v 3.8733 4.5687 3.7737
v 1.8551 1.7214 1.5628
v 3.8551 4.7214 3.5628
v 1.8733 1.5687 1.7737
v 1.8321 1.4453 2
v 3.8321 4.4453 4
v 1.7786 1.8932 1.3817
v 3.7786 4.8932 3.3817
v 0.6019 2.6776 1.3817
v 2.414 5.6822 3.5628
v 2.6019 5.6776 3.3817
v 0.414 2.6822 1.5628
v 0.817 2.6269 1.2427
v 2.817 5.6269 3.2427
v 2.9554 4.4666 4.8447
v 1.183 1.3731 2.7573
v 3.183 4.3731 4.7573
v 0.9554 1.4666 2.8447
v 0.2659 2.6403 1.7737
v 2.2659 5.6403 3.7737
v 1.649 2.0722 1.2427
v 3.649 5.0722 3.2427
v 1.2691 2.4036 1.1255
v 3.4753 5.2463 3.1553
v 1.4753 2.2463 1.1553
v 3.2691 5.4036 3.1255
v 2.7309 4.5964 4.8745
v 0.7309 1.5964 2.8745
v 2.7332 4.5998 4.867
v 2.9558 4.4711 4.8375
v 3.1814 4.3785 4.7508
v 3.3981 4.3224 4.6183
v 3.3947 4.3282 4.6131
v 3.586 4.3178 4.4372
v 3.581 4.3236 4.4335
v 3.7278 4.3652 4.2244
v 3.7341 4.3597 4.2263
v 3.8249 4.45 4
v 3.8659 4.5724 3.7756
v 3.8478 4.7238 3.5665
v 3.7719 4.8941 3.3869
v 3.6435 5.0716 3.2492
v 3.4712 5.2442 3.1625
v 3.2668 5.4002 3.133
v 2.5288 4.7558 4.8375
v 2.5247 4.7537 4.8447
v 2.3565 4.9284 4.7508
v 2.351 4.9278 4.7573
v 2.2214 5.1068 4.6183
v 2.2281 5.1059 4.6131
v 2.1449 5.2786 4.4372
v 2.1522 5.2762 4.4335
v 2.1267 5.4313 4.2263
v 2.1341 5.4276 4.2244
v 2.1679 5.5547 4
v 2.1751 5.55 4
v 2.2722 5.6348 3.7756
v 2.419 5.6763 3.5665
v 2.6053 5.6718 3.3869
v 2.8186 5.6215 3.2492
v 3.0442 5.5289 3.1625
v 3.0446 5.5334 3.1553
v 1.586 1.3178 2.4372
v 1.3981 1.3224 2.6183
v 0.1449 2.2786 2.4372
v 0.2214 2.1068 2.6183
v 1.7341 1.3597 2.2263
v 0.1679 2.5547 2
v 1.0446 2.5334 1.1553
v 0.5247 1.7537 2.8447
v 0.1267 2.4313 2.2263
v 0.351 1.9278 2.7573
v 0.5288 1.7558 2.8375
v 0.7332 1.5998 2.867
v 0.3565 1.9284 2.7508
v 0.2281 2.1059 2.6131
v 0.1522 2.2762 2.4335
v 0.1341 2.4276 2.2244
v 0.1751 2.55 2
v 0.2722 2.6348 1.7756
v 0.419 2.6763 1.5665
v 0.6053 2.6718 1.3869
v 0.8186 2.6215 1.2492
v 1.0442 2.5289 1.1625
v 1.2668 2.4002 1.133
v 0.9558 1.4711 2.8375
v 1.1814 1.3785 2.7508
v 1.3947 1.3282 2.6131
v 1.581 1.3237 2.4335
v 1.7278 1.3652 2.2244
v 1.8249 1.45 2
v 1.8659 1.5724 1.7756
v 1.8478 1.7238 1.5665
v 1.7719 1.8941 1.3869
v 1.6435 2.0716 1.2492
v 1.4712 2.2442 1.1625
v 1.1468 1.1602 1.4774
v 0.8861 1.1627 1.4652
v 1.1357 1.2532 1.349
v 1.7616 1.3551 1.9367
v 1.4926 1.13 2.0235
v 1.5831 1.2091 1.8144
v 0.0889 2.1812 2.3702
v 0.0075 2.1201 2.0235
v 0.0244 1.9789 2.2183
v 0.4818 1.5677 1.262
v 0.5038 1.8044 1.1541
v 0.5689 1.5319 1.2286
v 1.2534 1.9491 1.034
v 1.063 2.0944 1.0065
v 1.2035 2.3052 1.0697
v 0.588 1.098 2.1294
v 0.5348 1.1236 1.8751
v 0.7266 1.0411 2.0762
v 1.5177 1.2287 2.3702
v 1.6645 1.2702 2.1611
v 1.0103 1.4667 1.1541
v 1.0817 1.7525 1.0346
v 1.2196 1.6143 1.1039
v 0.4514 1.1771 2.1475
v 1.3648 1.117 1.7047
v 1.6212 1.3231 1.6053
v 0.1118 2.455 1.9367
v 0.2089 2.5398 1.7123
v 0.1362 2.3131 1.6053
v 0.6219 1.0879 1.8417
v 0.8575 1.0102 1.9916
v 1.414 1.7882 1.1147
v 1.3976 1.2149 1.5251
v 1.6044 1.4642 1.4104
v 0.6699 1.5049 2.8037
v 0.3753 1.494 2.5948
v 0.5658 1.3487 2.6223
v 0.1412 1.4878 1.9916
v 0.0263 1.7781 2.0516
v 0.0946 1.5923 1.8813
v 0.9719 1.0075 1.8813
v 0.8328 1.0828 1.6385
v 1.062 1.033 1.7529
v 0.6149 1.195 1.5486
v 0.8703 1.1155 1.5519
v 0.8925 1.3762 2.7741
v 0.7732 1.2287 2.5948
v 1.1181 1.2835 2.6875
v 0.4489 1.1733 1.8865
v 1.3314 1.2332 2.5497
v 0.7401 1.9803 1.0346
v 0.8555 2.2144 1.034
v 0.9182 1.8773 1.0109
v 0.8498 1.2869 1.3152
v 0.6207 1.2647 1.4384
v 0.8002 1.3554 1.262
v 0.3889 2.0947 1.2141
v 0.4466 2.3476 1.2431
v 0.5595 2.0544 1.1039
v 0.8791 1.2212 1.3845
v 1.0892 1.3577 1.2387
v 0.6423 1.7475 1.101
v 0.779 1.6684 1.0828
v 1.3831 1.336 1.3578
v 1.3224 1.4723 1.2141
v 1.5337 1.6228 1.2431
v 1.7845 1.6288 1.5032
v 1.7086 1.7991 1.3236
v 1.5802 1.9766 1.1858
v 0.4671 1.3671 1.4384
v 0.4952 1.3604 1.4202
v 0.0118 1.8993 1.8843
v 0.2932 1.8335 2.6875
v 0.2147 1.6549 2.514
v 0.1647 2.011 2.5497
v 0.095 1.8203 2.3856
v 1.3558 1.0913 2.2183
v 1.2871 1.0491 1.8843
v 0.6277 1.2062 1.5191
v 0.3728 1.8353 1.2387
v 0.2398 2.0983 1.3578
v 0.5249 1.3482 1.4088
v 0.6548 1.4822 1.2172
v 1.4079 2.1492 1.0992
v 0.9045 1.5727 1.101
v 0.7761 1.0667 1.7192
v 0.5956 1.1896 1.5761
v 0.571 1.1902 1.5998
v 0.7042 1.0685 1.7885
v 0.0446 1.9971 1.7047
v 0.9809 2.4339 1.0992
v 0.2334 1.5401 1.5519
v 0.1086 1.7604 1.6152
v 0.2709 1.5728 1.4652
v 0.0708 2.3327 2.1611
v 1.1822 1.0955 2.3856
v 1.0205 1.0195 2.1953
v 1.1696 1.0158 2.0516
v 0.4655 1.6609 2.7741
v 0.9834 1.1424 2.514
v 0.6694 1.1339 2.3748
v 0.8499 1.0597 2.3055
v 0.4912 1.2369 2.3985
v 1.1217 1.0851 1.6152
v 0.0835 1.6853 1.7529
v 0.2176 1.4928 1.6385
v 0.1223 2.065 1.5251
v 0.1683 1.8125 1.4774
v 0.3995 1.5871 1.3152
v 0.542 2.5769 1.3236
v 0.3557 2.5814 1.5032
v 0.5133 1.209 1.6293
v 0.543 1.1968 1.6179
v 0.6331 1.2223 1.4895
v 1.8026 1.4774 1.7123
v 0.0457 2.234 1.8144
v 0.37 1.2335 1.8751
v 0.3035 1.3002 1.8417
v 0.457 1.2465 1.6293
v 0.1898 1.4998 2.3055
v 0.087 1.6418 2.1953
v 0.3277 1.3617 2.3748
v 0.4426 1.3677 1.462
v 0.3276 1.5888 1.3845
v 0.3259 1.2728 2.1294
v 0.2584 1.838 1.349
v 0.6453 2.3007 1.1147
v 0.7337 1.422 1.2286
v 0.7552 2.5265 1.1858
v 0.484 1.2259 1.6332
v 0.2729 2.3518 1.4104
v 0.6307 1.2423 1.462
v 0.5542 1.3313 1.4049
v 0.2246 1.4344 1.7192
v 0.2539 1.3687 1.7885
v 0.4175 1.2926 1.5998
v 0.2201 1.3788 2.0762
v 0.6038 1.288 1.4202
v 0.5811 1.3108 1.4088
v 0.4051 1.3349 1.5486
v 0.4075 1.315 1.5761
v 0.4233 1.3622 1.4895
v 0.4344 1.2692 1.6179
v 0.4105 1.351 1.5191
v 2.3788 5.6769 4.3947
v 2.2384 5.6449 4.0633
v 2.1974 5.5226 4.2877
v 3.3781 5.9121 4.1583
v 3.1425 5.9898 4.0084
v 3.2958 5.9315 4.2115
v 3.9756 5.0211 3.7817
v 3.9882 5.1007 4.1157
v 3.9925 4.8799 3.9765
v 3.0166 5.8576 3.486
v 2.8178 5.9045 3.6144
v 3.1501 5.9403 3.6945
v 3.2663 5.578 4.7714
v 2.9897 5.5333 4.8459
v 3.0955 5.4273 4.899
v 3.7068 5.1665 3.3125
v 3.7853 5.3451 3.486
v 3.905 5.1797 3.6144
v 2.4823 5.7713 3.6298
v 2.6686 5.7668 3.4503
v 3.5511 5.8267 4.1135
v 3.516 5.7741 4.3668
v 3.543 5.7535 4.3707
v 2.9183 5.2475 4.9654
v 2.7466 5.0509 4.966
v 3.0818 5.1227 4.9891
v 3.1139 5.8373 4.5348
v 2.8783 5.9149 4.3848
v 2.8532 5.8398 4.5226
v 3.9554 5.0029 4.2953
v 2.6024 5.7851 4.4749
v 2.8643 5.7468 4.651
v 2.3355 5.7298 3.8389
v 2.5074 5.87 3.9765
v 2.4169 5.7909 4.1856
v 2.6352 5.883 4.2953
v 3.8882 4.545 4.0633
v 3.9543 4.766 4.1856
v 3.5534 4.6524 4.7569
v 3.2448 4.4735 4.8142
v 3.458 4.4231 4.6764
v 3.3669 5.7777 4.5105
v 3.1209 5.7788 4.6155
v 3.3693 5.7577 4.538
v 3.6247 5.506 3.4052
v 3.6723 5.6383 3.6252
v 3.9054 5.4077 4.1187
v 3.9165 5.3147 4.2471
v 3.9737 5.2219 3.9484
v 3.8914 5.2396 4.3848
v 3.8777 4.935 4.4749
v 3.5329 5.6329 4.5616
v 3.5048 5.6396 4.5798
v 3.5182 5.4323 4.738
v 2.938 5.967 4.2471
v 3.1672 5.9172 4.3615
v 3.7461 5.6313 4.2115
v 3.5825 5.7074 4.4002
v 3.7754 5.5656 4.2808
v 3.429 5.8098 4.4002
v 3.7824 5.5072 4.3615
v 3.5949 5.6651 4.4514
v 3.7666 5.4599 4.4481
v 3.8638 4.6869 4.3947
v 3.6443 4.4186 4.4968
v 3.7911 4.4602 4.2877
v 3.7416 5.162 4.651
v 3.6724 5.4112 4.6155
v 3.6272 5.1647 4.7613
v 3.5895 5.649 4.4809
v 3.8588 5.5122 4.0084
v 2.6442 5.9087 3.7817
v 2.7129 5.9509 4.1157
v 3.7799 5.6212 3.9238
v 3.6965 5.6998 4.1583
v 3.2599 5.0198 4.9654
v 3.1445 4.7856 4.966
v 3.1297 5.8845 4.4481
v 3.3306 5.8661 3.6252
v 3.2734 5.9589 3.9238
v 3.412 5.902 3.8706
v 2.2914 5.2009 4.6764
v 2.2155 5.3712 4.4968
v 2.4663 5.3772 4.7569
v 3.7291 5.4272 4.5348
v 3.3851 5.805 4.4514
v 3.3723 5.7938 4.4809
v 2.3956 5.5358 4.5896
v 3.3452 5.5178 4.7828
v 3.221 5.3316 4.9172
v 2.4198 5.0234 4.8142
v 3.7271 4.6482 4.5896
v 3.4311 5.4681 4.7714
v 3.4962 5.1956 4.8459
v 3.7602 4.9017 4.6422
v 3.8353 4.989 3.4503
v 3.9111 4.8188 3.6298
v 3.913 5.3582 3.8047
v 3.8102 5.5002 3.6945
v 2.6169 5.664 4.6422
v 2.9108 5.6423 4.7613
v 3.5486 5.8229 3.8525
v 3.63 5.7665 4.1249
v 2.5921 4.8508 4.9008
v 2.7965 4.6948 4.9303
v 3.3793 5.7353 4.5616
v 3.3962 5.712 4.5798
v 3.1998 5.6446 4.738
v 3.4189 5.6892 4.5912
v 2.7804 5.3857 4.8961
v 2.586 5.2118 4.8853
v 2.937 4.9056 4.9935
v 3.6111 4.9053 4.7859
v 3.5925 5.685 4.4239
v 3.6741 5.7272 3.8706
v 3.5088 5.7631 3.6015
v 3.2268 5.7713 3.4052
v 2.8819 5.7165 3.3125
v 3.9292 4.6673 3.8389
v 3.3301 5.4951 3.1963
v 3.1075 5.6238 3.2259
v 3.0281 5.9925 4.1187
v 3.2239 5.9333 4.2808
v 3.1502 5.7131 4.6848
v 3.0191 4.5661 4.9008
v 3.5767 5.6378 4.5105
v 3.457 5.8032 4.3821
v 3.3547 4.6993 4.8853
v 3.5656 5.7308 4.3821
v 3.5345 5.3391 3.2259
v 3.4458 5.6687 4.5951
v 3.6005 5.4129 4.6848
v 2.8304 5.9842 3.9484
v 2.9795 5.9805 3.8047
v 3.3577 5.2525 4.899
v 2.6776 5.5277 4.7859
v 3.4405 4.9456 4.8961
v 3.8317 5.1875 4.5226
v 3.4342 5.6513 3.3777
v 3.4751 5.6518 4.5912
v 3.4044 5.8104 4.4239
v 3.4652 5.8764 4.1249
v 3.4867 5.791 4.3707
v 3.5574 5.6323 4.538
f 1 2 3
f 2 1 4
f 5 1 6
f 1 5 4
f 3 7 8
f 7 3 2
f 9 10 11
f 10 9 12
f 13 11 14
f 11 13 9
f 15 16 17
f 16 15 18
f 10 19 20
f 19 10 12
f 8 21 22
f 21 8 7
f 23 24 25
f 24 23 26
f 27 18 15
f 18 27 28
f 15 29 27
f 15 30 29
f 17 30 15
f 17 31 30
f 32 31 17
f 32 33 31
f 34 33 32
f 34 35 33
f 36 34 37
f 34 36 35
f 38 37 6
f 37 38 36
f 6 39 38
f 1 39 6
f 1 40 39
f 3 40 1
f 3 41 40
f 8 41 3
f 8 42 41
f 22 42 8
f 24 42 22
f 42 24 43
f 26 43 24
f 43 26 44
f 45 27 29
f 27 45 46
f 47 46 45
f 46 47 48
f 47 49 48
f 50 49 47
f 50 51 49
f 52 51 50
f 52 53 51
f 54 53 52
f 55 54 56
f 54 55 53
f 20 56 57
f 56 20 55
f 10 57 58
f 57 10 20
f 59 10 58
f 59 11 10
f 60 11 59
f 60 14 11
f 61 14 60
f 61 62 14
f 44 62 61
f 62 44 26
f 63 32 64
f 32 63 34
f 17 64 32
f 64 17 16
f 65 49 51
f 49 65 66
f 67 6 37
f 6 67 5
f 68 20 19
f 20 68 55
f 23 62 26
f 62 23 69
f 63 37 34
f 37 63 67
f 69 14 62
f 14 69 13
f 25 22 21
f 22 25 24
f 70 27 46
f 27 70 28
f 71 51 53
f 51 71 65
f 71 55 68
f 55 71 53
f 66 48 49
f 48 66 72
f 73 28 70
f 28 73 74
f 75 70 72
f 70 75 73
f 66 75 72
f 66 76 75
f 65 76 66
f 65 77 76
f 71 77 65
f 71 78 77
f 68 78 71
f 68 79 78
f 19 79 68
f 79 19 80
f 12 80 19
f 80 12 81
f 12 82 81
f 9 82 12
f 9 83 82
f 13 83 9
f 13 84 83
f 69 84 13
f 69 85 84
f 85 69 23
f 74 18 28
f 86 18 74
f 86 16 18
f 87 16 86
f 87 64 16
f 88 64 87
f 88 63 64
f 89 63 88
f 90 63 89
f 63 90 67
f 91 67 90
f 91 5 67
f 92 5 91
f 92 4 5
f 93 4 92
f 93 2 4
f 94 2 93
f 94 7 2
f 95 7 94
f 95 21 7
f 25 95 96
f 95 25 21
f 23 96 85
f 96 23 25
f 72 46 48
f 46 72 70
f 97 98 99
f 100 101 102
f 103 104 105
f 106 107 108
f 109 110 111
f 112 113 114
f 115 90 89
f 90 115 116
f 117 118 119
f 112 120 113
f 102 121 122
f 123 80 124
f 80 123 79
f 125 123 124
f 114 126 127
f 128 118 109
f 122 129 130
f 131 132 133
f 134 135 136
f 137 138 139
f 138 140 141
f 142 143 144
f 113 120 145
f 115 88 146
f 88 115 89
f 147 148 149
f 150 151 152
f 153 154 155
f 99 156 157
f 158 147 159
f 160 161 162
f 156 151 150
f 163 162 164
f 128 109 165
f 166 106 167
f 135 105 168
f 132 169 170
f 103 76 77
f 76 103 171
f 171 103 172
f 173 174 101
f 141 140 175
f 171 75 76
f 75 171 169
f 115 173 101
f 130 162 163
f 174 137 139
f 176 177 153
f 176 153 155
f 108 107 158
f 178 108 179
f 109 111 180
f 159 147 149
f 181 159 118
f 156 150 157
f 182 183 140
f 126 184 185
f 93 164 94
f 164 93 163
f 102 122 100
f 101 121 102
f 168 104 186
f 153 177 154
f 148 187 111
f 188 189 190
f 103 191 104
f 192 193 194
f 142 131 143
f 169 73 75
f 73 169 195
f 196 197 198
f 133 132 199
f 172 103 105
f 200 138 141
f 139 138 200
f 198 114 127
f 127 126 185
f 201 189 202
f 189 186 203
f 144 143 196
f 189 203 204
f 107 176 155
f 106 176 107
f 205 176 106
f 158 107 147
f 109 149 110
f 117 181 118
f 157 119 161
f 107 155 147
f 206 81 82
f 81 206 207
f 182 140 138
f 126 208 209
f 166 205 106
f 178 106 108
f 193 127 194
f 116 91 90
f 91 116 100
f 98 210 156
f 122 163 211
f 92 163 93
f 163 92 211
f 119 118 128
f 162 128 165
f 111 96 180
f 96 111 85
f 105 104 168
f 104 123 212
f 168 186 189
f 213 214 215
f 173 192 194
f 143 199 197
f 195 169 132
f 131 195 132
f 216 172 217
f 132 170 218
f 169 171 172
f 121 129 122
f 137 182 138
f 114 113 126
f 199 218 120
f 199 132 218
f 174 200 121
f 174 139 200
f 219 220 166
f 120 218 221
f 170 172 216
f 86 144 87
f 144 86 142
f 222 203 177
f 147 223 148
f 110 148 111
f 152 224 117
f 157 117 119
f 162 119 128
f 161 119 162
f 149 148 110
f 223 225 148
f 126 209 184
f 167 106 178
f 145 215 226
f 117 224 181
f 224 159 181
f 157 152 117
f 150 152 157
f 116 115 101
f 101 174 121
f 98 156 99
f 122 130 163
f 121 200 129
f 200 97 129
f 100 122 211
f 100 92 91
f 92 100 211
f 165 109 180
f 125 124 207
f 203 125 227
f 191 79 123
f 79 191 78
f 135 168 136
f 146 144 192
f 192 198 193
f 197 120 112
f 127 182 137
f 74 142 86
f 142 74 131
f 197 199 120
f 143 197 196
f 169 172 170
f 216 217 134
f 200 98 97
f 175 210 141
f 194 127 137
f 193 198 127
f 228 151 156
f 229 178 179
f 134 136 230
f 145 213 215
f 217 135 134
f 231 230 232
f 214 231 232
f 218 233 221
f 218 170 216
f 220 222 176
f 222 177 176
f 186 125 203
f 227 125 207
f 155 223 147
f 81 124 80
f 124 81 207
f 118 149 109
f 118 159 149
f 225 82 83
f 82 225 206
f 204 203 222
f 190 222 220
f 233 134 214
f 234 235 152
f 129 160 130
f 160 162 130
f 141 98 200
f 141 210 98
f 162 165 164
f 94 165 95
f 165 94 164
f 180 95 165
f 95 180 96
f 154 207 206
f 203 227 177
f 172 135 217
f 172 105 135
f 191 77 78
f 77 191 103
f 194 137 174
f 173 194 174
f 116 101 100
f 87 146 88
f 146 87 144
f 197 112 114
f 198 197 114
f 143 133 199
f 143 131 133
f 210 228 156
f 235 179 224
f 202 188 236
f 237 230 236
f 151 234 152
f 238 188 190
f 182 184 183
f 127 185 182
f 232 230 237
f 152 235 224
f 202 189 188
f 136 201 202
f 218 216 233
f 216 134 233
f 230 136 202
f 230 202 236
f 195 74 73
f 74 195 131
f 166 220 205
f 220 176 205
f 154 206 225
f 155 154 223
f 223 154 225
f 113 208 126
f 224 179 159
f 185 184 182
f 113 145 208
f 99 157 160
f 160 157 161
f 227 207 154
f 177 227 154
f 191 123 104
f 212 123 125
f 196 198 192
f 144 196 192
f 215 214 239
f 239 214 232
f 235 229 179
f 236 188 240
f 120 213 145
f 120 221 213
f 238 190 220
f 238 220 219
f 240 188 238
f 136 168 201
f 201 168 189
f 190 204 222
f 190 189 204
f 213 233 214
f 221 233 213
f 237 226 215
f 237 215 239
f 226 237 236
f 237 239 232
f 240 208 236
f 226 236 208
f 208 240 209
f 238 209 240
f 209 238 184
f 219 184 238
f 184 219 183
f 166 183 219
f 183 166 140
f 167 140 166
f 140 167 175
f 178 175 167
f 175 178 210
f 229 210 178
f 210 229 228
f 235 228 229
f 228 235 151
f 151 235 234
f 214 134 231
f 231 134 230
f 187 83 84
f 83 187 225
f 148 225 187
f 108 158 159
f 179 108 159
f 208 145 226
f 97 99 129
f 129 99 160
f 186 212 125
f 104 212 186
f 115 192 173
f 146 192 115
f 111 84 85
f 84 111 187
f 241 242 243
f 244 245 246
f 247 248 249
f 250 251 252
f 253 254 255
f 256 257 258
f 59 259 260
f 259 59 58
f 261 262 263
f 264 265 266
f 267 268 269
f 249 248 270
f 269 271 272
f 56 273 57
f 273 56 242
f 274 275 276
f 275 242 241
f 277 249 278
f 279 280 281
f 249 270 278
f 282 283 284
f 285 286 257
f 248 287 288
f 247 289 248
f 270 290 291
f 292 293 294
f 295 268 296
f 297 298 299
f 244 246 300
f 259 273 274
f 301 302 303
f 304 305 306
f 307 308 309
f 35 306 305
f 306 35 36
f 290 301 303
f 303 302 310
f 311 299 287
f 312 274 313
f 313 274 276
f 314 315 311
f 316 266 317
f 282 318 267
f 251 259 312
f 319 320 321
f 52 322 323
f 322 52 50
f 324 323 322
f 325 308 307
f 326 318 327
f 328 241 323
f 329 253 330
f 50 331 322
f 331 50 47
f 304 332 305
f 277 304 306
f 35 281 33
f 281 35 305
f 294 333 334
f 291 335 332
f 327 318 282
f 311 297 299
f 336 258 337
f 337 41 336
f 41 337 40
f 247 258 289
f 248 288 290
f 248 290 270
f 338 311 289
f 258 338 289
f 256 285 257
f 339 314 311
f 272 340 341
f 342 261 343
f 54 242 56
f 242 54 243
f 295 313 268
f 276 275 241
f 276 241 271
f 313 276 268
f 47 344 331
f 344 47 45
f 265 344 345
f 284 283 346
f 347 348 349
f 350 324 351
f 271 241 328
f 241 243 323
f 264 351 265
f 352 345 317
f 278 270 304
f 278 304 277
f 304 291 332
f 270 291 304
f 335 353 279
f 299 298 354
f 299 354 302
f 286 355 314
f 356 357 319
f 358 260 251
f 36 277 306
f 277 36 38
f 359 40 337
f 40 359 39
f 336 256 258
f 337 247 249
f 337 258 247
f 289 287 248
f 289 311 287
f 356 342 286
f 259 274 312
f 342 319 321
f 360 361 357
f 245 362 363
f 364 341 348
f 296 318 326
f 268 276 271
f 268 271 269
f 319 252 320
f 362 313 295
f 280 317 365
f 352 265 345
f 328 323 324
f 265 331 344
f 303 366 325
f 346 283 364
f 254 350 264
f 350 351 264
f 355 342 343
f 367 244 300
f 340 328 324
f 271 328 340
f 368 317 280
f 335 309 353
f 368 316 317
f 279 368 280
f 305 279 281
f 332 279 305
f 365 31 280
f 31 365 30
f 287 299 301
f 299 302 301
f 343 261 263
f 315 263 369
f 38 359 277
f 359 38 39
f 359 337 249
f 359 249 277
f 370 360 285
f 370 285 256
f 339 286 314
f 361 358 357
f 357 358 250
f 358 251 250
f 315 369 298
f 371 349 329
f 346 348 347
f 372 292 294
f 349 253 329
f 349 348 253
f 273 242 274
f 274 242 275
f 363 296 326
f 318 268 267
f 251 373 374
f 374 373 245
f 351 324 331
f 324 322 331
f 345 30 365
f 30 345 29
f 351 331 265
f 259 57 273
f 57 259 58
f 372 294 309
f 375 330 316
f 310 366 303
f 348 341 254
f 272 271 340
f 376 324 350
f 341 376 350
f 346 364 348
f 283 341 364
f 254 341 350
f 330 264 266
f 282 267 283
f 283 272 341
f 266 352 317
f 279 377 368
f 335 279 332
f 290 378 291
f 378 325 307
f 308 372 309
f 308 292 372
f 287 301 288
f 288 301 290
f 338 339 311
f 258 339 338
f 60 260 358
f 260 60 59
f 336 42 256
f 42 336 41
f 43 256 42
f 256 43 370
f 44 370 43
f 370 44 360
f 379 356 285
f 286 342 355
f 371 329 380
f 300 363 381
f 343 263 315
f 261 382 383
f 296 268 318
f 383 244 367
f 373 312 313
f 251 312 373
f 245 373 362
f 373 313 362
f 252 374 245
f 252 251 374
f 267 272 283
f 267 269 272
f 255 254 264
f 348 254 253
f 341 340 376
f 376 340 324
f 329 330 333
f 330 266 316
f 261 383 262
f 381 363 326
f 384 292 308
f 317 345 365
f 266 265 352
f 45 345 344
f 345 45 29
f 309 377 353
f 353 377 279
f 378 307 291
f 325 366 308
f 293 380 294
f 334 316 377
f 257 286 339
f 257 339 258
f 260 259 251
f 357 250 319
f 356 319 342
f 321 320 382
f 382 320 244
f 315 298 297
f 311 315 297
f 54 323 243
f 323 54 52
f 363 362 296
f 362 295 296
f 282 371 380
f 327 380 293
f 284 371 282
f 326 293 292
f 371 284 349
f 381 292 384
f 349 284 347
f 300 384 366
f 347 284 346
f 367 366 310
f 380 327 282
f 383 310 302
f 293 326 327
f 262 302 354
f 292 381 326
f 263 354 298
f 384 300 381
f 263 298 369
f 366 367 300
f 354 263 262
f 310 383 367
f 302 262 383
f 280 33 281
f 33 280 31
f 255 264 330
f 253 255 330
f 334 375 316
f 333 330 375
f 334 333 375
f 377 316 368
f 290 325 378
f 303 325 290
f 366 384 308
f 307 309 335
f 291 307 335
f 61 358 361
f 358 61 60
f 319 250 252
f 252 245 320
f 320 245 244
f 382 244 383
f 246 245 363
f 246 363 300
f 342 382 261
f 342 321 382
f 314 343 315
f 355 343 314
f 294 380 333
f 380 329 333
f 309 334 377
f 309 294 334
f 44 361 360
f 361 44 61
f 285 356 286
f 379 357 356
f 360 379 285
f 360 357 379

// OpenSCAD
module rod(a, b, r) {
    dir = b-a;
    h   = norm(dir);
    if(dir[0] == 0 && dir[1] == 0) {
        // no transformation necessary
        cylinder(r=r, h=h);
	translate(a) sphere(r=r);
	translate(b) sphere(r=r);
    }
    else {
        w  = dir / h;
        u0 = cross(w, [0,0,1]);
        u  = u0 / norm(u0);
        v0 = cross(w, u);
        v  = v0 / norm(v0);
        multmatrix(m=[[u[0], v[0], w[0], a[0]],
                      [u[1], v[1], w[1], a[1]],
                      [u[2], v[2], w[2], a[2]],
                      [0,    0,    0,    1]])
	union () {
	     cylinder(r=r, h=h);
	     sphere(r=r);
	     translate([0,0,h]) sphere(r=r);
	}
    }
}

rod([1,2,2], [3,5,4], 1, $fn=24);
